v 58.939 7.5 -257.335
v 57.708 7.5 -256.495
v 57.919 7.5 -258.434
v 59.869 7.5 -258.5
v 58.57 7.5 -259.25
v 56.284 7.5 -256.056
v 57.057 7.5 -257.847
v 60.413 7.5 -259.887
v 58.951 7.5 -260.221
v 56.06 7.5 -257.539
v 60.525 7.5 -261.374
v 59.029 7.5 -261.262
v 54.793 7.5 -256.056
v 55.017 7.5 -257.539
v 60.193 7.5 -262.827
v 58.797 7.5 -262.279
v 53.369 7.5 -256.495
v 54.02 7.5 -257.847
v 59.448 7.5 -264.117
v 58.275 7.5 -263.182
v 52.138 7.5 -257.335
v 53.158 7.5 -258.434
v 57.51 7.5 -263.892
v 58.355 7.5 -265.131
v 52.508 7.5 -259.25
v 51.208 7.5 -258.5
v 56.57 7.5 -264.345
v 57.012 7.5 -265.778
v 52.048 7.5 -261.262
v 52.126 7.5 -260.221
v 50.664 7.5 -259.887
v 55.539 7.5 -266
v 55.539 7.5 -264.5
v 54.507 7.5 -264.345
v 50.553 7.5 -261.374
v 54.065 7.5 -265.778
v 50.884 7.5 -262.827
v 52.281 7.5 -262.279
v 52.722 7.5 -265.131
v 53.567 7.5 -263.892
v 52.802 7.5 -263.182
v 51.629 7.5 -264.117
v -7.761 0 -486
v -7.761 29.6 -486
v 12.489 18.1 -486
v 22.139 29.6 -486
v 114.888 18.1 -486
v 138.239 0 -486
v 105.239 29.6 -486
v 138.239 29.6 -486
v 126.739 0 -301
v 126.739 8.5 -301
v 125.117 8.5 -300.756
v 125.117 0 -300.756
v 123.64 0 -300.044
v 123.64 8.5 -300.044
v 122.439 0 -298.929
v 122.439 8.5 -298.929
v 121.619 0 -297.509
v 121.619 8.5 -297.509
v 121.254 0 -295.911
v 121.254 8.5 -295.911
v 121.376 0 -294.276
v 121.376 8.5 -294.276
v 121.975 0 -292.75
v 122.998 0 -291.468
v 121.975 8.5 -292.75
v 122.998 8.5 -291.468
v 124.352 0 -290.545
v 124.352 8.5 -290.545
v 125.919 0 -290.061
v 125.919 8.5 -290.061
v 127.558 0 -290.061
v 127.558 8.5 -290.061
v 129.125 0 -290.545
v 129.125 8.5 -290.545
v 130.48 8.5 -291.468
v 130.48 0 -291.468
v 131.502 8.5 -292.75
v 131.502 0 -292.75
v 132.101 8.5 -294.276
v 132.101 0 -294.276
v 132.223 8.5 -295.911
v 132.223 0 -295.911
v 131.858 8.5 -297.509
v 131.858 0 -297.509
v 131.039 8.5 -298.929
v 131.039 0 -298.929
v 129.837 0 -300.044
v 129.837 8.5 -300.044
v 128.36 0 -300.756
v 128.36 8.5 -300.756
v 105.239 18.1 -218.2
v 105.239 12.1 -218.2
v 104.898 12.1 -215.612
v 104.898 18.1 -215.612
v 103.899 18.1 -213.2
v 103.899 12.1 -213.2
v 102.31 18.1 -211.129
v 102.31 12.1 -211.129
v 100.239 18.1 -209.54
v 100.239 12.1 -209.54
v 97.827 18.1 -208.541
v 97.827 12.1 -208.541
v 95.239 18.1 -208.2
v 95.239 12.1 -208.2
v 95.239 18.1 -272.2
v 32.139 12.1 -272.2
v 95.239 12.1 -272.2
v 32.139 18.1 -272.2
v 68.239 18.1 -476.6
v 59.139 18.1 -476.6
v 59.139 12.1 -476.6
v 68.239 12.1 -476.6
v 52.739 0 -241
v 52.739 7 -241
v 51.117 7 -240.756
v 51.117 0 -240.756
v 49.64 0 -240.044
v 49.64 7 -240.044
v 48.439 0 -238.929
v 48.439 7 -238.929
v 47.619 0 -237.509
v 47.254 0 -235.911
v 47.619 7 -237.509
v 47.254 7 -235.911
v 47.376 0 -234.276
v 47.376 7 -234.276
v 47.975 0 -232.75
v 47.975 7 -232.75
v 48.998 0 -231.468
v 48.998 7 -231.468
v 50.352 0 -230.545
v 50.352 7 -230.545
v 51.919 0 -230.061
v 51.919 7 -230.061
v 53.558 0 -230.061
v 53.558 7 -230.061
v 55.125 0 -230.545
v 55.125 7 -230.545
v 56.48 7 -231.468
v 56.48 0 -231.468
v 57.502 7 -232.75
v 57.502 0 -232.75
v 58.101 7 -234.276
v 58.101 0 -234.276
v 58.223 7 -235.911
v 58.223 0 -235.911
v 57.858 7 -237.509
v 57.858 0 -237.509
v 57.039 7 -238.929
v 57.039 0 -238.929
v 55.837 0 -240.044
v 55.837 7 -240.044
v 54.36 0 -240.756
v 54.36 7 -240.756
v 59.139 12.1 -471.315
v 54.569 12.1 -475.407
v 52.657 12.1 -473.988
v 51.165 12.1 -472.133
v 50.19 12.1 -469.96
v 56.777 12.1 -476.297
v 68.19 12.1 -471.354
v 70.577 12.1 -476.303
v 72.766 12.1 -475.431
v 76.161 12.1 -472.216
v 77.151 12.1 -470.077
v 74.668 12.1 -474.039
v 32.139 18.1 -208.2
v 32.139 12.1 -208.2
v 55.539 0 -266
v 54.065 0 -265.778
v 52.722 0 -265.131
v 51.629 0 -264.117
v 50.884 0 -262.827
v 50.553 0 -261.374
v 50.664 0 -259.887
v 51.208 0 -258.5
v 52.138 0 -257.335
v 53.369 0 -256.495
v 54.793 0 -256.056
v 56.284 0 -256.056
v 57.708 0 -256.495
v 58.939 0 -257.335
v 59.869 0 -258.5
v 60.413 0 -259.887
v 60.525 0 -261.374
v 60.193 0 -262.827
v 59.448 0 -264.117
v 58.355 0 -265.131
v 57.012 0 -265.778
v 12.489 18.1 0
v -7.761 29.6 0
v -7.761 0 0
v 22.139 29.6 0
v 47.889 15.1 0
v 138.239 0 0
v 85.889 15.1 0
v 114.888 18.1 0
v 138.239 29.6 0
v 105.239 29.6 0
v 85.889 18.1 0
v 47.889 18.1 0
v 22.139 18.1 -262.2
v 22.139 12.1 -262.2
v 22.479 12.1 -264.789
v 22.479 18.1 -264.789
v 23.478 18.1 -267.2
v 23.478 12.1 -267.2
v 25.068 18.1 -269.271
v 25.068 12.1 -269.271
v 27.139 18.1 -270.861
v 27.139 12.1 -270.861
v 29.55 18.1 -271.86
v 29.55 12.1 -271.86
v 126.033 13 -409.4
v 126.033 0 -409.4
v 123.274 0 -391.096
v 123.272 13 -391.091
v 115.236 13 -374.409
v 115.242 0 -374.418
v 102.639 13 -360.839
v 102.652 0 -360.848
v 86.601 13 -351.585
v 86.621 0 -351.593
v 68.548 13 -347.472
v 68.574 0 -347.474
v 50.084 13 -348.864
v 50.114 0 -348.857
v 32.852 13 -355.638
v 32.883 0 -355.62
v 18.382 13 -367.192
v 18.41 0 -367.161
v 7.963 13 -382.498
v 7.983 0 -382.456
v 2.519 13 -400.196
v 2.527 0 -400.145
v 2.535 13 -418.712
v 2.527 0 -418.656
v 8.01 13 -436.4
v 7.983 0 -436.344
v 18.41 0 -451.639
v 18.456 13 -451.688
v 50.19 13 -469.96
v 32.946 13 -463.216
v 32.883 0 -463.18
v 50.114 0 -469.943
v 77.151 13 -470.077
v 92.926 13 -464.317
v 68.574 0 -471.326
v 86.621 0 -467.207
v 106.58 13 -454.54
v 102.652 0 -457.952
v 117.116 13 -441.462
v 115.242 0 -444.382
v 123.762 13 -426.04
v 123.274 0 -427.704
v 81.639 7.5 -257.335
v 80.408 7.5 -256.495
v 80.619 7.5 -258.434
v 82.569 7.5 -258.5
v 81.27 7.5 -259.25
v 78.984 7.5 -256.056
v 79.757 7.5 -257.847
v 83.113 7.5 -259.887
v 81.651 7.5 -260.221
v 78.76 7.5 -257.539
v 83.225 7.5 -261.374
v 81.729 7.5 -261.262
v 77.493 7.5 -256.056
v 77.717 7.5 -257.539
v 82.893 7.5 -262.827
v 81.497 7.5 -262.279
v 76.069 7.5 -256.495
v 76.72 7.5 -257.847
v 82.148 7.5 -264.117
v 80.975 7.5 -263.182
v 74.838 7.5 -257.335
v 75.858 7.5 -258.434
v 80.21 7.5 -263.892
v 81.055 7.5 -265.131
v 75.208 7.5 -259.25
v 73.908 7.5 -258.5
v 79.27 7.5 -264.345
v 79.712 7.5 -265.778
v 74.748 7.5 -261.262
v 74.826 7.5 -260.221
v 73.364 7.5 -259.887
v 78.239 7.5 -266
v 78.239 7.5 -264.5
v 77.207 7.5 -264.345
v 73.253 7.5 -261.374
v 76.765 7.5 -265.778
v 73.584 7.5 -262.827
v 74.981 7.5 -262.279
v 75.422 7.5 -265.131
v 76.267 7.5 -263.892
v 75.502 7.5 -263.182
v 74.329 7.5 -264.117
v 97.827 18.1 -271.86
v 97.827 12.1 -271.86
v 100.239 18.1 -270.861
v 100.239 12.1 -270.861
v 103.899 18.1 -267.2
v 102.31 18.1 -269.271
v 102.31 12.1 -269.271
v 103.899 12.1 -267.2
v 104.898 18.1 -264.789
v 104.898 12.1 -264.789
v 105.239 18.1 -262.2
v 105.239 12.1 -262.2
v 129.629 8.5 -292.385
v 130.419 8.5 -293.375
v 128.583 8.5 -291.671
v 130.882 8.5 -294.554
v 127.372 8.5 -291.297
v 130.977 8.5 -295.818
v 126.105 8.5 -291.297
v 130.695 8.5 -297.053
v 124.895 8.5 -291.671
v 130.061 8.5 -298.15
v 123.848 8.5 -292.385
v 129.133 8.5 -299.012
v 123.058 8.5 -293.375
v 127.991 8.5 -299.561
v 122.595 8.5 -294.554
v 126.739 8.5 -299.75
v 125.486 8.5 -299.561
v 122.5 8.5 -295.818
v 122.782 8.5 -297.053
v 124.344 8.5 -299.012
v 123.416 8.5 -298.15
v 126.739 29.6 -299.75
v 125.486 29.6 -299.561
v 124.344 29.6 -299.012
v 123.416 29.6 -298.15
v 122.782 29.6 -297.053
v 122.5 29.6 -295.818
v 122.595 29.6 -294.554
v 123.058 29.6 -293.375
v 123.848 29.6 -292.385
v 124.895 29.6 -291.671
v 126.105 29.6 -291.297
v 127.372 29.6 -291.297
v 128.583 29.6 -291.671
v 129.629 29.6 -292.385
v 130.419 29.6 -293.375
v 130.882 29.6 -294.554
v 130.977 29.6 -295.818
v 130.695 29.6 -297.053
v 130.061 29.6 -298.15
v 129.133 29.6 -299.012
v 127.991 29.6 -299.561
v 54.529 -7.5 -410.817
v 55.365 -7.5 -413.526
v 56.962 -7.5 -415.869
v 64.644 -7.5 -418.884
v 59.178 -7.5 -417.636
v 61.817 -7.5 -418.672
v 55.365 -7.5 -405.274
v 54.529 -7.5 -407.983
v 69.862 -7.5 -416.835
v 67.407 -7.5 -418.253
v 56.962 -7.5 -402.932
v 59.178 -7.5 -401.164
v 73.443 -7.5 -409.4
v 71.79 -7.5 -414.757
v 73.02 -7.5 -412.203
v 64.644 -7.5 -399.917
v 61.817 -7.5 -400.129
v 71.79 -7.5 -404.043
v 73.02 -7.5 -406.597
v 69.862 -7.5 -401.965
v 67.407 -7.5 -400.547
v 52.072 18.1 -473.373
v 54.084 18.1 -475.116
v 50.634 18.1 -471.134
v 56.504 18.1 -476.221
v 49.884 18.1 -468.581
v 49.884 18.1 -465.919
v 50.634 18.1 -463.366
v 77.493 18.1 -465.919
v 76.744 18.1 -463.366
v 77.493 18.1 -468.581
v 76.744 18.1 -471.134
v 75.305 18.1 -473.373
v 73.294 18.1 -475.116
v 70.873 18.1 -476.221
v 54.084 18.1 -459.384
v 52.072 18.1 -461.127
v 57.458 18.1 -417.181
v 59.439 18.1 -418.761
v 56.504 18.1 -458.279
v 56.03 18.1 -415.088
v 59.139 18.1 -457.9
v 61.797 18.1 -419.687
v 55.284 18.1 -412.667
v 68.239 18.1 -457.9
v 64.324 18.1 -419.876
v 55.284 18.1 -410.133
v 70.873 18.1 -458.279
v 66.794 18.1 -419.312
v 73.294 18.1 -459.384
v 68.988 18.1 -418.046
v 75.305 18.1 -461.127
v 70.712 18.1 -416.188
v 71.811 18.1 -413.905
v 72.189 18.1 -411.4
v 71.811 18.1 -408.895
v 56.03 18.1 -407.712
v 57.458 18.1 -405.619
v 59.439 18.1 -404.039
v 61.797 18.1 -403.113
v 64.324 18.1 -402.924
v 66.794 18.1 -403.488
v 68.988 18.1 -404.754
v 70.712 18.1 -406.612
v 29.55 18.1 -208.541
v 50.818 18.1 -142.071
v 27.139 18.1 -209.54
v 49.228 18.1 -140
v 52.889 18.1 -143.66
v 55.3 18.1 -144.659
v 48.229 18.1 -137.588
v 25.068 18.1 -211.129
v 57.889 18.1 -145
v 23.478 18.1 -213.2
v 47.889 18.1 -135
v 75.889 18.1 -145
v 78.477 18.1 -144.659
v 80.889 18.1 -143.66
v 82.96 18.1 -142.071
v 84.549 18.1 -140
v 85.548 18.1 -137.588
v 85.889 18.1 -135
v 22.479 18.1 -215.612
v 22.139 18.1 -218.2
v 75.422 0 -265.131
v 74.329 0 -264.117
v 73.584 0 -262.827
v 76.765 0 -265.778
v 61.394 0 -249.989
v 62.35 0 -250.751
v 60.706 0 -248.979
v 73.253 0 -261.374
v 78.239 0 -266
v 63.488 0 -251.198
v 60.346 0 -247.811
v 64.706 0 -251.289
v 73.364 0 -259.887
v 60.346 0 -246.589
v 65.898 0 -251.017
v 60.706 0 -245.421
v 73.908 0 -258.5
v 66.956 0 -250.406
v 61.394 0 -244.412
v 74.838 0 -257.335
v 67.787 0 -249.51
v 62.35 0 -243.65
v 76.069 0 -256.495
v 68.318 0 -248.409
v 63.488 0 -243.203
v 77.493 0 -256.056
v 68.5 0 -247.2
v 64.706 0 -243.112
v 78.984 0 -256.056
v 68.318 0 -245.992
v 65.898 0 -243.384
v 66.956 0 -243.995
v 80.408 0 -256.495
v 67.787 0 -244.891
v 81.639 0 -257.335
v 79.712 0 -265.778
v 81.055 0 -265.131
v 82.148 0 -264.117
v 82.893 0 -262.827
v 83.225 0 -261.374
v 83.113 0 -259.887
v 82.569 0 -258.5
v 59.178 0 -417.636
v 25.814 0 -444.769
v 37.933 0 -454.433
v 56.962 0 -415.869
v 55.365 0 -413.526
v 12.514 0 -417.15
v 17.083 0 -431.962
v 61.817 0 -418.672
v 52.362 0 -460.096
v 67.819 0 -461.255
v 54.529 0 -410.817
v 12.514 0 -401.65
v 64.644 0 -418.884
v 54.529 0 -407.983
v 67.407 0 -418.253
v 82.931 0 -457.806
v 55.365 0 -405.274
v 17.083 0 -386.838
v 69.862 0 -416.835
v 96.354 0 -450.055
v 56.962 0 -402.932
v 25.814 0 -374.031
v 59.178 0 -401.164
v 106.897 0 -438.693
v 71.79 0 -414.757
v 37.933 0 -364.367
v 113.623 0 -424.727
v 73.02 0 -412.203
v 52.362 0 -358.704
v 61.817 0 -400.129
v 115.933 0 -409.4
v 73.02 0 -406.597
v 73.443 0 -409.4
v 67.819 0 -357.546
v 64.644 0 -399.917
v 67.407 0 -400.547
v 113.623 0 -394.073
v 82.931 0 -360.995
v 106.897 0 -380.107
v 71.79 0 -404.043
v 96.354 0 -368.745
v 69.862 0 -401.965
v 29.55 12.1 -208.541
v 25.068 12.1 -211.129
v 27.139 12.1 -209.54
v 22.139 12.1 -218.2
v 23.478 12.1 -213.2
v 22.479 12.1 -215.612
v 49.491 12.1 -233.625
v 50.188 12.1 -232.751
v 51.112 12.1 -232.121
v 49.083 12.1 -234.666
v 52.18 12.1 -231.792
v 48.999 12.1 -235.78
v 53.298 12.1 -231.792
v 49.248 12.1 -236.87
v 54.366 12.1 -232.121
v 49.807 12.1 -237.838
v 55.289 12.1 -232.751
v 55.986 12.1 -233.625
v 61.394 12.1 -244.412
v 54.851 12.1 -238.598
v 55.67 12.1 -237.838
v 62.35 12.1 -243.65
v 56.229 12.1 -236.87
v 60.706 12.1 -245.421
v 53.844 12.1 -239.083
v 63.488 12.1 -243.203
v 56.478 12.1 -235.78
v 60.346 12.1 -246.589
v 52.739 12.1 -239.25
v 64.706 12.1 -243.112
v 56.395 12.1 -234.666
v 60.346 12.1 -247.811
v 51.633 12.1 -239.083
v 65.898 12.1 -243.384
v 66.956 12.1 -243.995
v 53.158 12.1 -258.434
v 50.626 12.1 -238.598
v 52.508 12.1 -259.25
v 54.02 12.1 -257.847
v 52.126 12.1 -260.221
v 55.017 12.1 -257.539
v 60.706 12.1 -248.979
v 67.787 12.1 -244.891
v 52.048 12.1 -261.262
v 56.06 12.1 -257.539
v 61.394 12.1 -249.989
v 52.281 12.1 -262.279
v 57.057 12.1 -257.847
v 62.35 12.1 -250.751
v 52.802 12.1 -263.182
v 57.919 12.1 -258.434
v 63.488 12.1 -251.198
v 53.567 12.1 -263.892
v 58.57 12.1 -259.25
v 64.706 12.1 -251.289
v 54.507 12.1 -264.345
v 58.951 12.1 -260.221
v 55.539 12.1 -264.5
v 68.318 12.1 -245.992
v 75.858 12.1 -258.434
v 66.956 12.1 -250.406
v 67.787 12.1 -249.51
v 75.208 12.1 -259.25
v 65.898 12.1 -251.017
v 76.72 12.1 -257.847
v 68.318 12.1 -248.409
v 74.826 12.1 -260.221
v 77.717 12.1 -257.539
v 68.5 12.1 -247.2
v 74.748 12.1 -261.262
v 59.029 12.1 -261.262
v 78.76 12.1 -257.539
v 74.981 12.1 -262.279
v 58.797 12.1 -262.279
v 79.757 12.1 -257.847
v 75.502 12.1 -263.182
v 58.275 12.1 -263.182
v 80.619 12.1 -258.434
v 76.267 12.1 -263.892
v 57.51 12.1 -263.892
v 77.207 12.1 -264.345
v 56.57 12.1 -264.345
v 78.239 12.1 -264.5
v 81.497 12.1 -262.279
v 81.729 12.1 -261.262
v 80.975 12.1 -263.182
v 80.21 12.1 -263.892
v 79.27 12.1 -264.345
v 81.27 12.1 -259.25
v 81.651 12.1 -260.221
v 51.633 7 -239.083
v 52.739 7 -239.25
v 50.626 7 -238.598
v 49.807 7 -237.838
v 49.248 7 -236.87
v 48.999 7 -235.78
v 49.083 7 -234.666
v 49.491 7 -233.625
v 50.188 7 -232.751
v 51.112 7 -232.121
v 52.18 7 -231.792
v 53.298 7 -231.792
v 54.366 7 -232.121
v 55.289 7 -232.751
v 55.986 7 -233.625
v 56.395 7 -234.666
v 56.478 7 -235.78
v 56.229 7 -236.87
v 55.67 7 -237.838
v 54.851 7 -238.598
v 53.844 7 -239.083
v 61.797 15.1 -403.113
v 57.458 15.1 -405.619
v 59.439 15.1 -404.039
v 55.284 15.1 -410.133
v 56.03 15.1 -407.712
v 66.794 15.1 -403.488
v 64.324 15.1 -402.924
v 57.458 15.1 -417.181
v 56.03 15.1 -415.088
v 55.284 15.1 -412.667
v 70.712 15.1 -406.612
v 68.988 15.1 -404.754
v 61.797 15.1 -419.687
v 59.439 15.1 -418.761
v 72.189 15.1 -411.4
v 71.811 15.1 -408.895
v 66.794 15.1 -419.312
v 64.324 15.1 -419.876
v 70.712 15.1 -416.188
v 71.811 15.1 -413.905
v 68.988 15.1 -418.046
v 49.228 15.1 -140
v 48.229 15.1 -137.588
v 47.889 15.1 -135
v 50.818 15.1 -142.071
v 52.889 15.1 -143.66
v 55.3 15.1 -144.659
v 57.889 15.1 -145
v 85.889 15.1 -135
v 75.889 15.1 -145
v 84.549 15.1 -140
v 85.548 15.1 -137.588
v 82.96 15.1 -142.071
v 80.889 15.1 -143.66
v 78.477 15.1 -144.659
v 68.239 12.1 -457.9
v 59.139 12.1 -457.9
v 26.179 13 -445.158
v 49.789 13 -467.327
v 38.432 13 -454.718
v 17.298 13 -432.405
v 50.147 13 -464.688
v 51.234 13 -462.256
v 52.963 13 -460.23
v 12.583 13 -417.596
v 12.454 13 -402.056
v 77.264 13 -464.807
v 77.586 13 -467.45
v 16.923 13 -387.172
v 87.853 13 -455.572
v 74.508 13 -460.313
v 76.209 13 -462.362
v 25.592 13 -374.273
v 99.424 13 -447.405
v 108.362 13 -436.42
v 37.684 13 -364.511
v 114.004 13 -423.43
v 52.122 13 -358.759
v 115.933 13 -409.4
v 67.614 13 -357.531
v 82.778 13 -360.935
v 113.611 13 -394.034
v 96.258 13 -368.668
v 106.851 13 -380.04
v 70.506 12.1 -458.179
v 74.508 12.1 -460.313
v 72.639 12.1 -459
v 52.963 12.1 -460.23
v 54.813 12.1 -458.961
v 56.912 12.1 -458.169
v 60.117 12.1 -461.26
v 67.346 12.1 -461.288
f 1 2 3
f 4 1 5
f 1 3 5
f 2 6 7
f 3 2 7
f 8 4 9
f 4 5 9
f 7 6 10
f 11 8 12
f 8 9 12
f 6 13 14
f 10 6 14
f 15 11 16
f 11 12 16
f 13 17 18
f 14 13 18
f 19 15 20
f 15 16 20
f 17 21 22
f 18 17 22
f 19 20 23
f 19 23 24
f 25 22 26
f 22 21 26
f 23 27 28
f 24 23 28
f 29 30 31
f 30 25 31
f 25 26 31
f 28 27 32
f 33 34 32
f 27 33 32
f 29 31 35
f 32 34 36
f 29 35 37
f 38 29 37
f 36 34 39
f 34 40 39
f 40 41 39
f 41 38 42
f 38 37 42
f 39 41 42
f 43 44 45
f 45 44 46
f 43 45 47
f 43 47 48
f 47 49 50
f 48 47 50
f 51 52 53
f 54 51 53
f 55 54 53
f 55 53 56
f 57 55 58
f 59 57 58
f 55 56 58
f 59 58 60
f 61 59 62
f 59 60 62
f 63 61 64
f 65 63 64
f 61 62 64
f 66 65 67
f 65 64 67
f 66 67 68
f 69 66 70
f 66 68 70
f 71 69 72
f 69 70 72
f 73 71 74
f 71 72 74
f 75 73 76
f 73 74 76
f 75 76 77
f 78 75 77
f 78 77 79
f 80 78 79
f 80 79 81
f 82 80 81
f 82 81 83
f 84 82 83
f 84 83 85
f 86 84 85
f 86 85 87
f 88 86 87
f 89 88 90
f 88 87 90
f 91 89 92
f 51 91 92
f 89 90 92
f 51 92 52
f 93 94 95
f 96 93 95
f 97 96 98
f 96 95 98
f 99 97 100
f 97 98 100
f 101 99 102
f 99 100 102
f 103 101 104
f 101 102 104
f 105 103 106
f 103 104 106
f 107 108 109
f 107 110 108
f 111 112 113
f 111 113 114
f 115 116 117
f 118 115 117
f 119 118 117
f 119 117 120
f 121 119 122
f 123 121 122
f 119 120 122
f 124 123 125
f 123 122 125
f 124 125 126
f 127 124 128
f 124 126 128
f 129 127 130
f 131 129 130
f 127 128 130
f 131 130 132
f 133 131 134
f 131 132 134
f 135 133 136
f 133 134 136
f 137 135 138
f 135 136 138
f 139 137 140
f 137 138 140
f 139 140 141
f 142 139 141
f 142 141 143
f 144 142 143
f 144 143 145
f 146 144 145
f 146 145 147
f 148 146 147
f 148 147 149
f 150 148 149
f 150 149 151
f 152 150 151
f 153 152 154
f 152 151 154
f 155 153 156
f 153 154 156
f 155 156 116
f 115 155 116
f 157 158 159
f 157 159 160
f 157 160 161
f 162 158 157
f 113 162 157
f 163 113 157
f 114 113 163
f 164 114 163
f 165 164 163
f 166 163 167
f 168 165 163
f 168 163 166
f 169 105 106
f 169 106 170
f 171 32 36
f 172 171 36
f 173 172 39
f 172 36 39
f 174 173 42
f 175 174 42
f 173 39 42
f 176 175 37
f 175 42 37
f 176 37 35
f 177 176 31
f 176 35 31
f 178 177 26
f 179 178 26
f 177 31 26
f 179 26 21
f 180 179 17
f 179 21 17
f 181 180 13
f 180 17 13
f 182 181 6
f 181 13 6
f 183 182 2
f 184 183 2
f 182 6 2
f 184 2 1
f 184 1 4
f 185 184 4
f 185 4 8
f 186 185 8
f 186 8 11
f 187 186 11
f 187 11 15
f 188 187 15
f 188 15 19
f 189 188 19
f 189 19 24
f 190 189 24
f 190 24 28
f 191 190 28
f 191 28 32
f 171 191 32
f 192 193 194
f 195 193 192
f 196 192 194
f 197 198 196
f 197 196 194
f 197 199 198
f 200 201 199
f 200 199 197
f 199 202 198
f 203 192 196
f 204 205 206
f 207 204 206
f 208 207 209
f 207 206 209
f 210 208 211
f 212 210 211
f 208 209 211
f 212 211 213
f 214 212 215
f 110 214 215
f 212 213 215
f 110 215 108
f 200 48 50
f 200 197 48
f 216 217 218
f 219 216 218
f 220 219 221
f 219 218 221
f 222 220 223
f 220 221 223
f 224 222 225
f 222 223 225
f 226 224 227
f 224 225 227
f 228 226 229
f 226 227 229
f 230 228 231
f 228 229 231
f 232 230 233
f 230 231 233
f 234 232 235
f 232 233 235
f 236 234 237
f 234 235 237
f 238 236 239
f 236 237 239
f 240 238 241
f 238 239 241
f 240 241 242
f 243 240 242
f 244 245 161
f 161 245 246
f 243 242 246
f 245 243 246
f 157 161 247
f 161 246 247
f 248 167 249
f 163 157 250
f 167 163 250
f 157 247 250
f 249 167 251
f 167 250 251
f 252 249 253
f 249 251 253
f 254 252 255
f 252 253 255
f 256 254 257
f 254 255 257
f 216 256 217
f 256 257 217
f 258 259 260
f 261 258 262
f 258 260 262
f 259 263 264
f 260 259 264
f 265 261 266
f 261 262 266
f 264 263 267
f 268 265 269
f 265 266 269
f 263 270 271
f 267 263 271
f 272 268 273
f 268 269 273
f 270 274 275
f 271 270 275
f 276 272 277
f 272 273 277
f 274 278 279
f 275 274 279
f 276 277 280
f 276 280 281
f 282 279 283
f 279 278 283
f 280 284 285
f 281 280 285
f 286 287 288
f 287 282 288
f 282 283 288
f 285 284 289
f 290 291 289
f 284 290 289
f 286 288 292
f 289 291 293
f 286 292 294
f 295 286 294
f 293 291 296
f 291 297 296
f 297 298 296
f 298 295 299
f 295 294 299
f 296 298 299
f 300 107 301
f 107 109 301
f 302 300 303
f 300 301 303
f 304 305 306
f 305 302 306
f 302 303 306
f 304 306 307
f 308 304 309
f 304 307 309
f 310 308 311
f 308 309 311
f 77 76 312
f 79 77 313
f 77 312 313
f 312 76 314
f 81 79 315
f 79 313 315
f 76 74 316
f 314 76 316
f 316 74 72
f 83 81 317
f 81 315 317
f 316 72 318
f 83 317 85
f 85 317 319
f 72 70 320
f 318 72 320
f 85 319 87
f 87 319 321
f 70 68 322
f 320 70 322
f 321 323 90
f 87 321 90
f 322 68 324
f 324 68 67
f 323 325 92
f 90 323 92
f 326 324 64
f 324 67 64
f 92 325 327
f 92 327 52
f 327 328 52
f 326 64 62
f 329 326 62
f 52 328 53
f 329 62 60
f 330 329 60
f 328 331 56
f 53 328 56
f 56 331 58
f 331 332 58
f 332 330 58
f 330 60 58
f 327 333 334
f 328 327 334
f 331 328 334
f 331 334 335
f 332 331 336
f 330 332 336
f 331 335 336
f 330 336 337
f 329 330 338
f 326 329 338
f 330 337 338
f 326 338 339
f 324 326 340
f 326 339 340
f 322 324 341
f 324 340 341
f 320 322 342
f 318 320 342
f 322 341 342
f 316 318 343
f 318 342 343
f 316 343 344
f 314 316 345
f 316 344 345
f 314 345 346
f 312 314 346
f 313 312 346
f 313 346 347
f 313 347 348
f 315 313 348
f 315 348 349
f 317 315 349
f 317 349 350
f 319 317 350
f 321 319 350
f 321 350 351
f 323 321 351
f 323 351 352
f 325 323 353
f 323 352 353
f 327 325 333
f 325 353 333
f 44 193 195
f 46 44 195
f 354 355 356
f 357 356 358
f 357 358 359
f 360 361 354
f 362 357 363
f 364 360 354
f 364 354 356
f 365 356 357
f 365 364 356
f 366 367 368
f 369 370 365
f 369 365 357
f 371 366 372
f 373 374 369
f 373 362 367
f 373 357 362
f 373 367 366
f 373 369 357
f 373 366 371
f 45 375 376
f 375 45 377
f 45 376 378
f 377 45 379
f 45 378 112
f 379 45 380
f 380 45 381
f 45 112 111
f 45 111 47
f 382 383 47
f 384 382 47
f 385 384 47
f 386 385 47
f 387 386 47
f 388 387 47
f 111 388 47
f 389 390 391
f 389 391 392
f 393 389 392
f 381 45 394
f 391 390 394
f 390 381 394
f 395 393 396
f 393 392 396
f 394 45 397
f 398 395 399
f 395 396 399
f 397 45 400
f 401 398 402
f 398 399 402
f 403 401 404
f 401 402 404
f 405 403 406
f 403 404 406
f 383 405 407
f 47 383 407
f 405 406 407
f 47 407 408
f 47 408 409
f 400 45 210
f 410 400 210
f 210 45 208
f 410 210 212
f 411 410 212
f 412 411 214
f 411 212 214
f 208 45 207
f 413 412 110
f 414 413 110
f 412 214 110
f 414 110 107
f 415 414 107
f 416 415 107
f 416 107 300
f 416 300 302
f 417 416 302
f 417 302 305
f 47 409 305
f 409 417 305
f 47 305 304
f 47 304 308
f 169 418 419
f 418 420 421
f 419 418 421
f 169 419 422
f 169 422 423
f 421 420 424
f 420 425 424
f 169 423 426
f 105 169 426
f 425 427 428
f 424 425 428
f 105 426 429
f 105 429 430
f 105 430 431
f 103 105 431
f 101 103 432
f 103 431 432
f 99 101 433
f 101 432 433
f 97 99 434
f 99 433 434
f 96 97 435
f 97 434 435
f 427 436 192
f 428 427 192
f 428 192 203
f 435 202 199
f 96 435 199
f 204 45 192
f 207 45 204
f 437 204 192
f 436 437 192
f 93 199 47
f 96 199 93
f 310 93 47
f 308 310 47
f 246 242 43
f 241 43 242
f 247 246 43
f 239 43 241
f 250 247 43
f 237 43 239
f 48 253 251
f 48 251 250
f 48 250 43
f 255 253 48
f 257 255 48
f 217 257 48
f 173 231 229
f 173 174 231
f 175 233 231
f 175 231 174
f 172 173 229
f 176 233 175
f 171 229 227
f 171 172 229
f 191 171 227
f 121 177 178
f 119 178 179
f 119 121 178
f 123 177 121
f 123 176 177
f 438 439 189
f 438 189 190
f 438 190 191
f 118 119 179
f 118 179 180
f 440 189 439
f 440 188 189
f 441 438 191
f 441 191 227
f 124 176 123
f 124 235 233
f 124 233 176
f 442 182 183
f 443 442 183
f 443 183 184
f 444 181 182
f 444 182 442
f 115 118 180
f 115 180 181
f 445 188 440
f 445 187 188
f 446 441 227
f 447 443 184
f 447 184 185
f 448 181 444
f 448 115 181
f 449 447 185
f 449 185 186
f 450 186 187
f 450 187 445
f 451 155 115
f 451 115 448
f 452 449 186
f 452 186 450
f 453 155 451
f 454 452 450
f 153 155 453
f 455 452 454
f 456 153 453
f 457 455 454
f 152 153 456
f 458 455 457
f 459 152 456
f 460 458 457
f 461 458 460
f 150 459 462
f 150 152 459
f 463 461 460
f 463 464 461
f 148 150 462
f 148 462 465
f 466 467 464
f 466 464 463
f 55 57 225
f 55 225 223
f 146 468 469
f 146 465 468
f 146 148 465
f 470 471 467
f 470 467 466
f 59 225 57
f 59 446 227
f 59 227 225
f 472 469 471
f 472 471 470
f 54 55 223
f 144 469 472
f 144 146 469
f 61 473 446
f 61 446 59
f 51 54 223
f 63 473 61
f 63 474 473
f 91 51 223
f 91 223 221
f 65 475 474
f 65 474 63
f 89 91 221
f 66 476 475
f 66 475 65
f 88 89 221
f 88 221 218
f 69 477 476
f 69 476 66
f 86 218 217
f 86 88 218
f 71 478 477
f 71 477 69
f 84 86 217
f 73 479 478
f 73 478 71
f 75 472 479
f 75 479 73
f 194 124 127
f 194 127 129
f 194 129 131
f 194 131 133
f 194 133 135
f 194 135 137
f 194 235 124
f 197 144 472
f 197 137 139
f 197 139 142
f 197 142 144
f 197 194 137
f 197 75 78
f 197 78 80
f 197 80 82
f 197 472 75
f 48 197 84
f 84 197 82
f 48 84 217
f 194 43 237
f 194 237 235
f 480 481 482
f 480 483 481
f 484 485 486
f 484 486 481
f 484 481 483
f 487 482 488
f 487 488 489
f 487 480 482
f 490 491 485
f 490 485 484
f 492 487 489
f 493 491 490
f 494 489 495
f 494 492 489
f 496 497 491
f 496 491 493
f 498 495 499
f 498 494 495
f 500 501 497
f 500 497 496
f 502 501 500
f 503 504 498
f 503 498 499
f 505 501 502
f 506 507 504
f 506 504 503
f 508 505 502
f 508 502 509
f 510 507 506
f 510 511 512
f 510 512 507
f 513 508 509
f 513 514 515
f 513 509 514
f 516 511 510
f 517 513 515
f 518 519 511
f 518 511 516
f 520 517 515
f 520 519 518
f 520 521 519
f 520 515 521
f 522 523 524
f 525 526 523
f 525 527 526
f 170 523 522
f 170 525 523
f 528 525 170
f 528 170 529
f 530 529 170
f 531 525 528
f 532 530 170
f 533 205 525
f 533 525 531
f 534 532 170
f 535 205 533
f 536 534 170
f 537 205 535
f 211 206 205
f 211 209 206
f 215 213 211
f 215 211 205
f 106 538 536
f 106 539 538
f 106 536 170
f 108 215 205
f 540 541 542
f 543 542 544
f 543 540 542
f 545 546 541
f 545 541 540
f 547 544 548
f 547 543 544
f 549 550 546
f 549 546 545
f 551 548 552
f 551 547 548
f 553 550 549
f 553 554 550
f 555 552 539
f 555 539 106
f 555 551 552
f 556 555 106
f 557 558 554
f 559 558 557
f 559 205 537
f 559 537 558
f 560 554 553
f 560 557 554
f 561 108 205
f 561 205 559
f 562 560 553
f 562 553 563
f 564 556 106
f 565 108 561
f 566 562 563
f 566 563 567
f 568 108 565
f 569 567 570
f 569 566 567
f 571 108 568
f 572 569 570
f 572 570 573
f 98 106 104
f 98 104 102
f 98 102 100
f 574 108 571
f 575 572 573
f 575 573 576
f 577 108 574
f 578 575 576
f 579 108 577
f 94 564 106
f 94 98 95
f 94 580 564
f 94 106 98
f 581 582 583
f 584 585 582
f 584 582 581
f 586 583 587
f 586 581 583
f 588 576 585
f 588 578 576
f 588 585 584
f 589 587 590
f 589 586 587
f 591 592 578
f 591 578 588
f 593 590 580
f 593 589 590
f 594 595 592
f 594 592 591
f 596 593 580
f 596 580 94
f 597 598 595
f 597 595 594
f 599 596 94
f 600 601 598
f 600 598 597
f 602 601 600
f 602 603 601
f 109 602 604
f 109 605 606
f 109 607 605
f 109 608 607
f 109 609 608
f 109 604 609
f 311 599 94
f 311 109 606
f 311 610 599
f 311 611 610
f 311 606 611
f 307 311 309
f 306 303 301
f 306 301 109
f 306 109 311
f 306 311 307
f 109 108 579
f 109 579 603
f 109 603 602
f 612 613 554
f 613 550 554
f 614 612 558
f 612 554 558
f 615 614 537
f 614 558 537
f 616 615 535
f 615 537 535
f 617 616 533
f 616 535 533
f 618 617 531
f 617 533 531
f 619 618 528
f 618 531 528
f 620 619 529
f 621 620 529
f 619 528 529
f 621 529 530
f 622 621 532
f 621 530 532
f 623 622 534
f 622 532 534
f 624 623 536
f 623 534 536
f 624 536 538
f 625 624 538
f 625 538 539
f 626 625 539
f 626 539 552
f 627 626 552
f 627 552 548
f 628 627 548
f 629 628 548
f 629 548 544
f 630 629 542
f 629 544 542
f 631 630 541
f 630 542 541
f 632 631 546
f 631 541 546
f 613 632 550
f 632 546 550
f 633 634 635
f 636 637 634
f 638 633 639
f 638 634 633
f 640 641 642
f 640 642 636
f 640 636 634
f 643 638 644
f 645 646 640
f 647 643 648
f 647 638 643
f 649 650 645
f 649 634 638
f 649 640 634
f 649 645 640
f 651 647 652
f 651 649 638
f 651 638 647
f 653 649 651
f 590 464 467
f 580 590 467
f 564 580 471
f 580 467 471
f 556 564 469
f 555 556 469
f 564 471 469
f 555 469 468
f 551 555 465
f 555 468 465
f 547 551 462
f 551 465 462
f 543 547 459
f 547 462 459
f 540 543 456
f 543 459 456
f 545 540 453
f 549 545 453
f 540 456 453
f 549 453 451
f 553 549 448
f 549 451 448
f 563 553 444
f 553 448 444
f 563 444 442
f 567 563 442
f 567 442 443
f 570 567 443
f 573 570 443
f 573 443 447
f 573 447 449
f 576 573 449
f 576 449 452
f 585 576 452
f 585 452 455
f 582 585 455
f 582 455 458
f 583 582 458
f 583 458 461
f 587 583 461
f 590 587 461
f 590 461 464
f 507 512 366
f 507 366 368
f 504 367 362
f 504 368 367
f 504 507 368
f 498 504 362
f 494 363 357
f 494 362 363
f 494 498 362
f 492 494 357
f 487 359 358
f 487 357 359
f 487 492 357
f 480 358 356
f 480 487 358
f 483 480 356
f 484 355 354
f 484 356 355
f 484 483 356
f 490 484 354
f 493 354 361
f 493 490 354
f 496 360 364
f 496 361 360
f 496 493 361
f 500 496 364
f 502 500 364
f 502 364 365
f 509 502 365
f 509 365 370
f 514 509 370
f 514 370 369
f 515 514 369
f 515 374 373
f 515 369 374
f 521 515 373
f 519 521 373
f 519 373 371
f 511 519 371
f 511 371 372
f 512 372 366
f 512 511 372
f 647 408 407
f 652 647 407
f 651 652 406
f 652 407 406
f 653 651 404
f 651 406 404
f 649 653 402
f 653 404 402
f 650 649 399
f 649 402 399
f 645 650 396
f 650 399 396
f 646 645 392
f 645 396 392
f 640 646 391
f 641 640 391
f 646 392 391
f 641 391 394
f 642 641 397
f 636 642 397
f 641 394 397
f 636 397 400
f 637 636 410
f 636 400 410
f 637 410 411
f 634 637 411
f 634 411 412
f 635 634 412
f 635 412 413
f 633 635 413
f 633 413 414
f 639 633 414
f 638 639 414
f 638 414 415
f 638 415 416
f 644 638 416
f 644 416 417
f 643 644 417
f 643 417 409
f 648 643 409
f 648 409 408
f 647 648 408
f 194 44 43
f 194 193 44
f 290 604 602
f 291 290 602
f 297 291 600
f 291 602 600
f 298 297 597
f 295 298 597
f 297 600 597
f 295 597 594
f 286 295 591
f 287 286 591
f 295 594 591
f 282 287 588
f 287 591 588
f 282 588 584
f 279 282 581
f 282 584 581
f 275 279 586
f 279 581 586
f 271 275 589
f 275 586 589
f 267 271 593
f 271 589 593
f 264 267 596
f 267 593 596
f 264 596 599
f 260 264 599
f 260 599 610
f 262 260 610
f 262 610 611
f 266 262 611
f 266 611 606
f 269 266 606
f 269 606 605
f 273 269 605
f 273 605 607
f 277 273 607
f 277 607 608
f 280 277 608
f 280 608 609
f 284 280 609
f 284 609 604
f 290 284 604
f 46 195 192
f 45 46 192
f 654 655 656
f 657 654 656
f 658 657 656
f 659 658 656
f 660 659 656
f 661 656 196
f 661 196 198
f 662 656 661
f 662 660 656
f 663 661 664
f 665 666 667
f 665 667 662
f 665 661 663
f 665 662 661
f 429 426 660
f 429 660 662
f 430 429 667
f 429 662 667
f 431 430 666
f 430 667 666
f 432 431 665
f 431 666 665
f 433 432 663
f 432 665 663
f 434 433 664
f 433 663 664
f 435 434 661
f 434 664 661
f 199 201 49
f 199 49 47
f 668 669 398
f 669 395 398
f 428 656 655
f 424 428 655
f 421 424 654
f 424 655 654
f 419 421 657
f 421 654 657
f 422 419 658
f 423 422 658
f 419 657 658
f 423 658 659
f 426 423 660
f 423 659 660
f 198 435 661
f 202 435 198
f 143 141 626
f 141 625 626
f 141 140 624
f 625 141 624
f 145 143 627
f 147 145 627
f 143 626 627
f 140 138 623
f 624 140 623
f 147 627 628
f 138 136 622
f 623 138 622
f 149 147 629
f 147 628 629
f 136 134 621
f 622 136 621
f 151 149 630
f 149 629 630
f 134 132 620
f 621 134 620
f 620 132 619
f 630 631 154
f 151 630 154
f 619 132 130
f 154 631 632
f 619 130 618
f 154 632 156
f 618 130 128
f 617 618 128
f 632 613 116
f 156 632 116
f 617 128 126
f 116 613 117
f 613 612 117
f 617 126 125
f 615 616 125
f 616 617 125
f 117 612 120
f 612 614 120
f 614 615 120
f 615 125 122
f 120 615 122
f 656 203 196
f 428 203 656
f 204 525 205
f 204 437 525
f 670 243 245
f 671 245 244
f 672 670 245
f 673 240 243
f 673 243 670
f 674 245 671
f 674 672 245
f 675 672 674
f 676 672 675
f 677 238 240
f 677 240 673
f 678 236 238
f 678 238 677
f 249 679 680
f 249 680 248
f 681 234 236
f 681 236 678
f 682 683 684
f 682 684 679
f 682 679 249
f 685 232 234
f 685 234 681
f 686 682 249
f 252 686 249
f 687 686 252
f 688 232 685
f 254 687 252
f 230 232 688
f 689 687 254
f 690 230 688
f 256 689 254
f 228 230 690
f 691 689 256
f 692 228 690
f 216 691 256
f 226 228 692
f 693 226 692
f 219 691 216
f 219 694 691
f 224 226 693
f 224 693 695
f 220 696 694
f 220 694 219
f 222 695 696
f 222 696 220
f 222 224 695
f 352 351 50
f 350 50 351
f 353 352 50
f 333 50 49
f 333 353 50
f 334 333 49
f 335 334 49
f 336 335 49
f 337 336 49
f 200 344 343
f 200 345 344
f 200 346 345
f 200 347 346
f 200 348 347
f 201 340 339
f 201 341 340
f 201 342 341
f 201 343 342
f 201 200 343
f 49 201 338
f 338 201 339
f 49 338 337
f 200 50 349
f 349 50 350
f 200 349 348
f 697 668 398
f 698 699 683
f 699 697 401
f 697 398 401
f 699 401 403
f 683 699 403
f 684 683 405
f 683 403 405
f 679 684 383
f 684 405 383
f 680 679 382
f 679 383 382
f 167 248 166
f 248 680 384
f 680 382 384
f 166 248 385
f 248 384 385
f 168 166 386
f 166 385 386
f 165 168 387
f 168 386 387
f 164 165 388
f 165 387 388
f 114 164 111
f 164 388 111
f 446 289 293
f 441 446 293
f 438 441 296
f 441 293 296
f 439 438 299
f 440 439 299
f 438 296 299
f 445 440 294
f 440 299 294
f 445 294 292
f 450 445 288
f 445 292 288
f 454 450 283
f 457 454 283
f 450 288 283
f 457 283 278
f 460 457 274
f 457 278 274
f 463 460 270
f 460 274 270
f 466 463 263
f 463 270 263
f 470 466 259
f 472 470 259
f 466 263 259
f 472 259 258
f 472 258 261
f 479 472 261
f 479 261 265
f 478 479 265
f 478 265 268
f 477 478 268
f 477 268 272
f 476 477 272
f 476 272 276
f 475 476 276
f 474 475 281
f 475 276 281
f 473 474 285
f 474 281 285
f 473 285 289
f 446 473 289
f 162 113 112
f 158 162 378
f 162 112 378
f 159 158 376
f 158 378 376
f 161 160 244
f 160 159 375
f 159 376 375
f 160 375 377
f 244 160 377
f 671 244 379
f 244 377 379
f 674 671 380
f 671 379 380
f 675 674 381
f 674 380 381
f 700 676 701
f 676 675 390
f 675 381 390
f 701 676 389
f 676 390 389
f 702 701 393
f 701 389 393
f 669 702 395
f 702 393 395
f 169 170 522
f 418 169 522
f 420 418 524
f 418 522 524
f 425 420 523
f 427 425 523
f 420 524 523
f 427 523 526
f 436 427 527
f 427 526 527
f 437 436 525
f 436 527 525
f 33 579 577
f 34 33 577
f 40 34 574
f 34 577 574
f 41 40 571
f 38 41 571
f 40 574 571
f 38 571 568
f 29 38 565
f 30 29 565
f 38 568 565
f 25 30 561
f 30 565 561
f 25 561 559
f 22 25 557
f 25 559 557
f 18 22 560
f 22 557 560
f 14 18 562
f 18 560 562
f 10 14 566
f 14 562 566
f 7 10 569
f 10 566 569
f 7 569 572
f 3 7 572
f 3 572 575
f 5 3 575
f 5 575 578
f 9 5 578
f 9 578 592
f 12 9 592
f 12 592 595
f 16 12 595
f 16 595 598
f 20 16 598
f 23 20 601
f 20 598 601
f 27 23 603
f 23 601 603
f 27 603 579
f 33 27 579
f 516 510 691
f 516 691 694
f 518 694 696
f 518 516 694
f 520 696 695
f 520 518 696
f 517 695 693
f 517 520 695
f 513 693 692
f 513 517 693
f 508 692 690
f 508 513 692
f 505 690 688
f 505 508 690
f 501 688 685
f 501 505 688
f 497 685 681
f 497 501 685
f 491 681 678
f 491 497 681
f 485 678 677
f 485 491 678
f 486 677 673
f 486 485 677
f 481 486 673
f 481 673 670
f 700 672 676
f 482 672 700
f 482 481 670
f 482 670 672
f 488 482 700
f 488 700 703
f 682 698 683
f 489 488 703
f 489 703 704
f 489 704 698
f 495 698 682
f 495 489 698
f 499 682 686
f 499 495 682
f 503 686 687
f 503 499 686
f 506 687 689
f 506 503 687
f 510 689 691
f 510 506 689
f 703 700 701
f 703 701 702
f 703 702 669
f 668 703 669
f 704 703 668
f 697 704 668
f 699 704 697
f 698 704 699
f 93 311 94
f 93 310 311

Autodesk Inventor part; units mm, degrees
ref_plane "YZ Plane" through (0, 0, 0) normal (1, 0, 0) x (0, 1, 0)
ref_plane "XZ Plane" through (0, 0, 0) normal (0, 1, 0) x (-1, 0, 0)
ref_plane "XY Plane" through (0, 0, 0) normal (0, 0, 1) x (1, 0, 0)
sketch "Sketch1" plane through (0, 0, 0) normal (0, 0, 1) x (1, 0, 0)
  line L0 (-7.7614, 0) -> (138.2386, 0)
  line L1 (138.2386, 0) -> (138.2386, 29.6)
  line L2 (-7.7614, 29.6) -> (-7.7614, 0)
  line L3 (-7.7614, 29.6) -> (22.1386, 29.6)
  line L4 (12.489, 18.1) -> (114.8883, 18.1)
  line L5 (22.1386, 29.6) -> (12.489, 18.1)
  line L6 (22.1386, 29.6) -> (41.4586, 29.6) construction
  line L7 (138.2386, 29.6) -> (105.2386, 29.6)
  line L8 (105.2386, 29.6) -> (114.8883, 18.1)
  point P0 (0, 0)
  dimension "d0" = 146
  dimension "d1" = 29.6
  dimension "d2" = 29.9
  dimension "d4" = 130
  dimension "d5" = 33
  dimension "d6" = 50
extrude "Extrusion1" add sketch "Sketch1" against normal blind 486
sketch "Sketch2" plane through (-7.7614, 29.6, 0) normal (0, 1, 0) x (1, 0, 0)
  line L0 (113, 0) -> (122.6496, 0) projected
  line L1 (124, 486) -> (113, 0)
  line L2 (113, 0) -> (113, 486) projected
  line L3 (113, 486) -> (124, 486)
  line L4 (122.6496, 0) -> (122.6496, 486) projected
  line L5 (113, 486) -> (113, 0)
  line L6 (146, 0) -> (146, 486) projected
  point P0 (7.7614, 0)
  dimension "d9" = 22
sketch "Sketch3" plane through (-7.7614, 0, 0) normal (0, -1, 0) x (1, 0, 0)
  line L0 (20.2504, -486) -> (122.6496, -486) projected
  line L1 (0, 0) -> (146, 0) projected
  circle A0 centre (71.6943, -409.4001) radius 62.1
  line L2 (71.45, -486) -> (71.4962, -471.5001)
  circle A1 centre (71.6943, -409.4001) radius 52
  circle A2 centre (71.6943, -409.4001) radius 9.51
  circle A3 centre (72.1613, -247.2004) radius 4.1
  point P0 (7.7614, 0)
  dimension "d10" = 124.2
  dimension "d11" = 14.5
  dimension "d12" = 62.1
  dimension "d13" = 104
  dimension "d14" = 19.02
  dimension "d15" = 8.2
extrude "Extrusion2" cut sketch "Sketch3" against normal blind 13 contours A0
extrude "Extrusion3" add sketch "Sketch3" along normal blind 7.5 contours A2
extrude "Extrusion4" cut sketch "Sketch3" against normal through all contours A3
sketch "Sketch4" plane through (12.489, 18.1, 0) normal (0, 1, 0) x (1, 0, 0)
  circle A0 centre (51.911, 247.2004) radius 4.1 projected
  circle A1 centre (51.911, 247.2004) radius 9.5
  line L0 (0, 486) -> (102.3993, 486) projected
  line L1 (51.1996, 486) -> (51.1996, 476.6)
  arc A2 (46.6496, 476.6) -> (46.6496, 457.9) centre (46.6496, 467.25) ccw
  arc A3 (55.7496, 457.9) -> (55.7496, 476.6) centre (55.7496, 467.25) ccw
  line L2 (46.6496, 476.6) -> (55.7496, 476.6)
  line L3 (46.6496, 457.9) -> (55.7496, 457.9)
  circle A4 centre (51.1996, 411.4) radius 8.5
  point P0 (-12.489, 0)
  point P1 (51.1996, 476.6)
  dimension "d23" = 19
  dimension "d26" = 9.4
  dimension "d29" = 0
  dimension "d30" = 18.7
  dimension "d31" = 18.7
  dimension "d38" = 17
  dimension "d39" = 46.5
extrude "Extrusion5" cut sketch "Sketch4" against normal blind 3.7 contours A1
extrude "Extrusion7" cut sketch "Sketch4" against normal blind 6 contours L2 A3 L3 A2
extrude "Extrusion8" cut sketch "Sketch4" against normal blind 3 contours A4
sketch "Sketch5" plane through (-7.7614, 0, 0) normal (0, -1, 0) x (1, 0, 0)
  point P0 (7.7614, 0)
sketch "Sketch6" plane through (-7.7614, 0, 0) normal (0, -1, 0) x (1, 0, 0)
  line L0 (146, -486) -> (0, -486) projected
  line L1 (146, 0) -> (146, -486) projected
  circle A0 centre (60.5, -235.5) radius 5.5
  line L2 (0, 0) -> (0, -486) projected
  circle A1 centre (134.5, -295.5) radius 5.5
  point P0 (7.7614, 0)
  point P1 (86, -261)
  dimension "d45" = 11
  dimension "d46" = 60.5
  dimension "d47" = 250.5
  dimension "d48" = 11
  dimension "d49" = 190.5
  dimension "d50" = 11.5
hole "Hole1" at (126.7386, 0, -295.5) direction (0, 1, 0) diameter 8.5 end through all counterbore diameter 11 counterbore depth 8.5
hole "Hole2" at (78.2386, 0, -261) direction (0, 1, 0) diameter 7 end through all counterbore diameter 10 counterbore depth 7.5
hole "Hole3" at (52.7386, 0, -235.5) direction (0, 1, 0) diameter 7.5 end through all counterbore diameter 11 counterbore depth 7
thread "Thread1" size "M9x1.25" class "6H" standard "ANSI Metric M Profile" full length
sketch "Sketch14" plane through (12.489, 18.1, 0) normal (0, 1, 0) x (1, 0, 0)
  circle A0 centre (51.911, 247.2004) radius 4.1 construction
  line L0 (51.911, 247.2004) -> (92.7496, 247.2004) construction
  line L1 (92.7496, 0) -> (92.7496, 486) construction
  line L2 (92.7496, 247.2004) -> (92.7496, 208.2004) construction
  line L3 (92.7496, 208.2004) -> (9.6496, 208.2004)
  line L4 (9.6496, 208.2004) -> (9.6496, 272.2004)
  line L5 (9.6496, 272.2004) -> (92.7496, 272.2004)
  line L6 (92.7496, 272.2004) -> (92.7496, 208.2004)
  point P0 (-12.489, 0)
  dimension "d82" = 39
  dimension "d83" = 83.1
  dimension "d84" = 64
extrude "Extrusion11" cut sketch "Sketch14" against normal blind 6
sketch "Sketch17" plane through (12.489, 18.1, 0) normal (0, 1, 0) x (1, 0, 0)
  line L0 (92.7496, 0) -> (92.7496, 486) construction
  line L1 (92.7496, 0) -> (73.3996, 0) construction
  line L2 (-20.2504, 0) -> (125.7496, 0) construction
  line L3 (73.3996, 0) -> (35.3996, 0)
  line L4 (35.3996, 0) -> (35.3996, 145)
  line L5 (35.3996, 145) -> (73.3996, 145)
  line L6 (73.3996, 145) -> (73.3996, 0)
  point P0 (-12.489, 0)
  dimension "d99" = 19.35
  dimension "d100" = 38
  dimension "d101" = 145
extrude "Extrusion13" cut sketch "Sketch17" against normal blind 3
sketch "Sketch18" plane through (-7.7614, 0, 0) normal (0, -1, 0) x (1, 0, 0)
  circle A0 centre (86, -261) radius 5 projected
  point P0 (7.7614, 0)
  point P1 (63.3, -261)
  dimension "d112" = 22.7
hole "Hole5" at (55.5386, 0, -261) direction (0, 1, 0) diameter 7 end through all counterbore diameter 10 counterbore depth 7.5
fillet "Fillet1" radius 10 6 edges at (22.1386, 15.1, -208.2004) (22.1386, 15.1, -272.2004) (105.2386, 15.1, -208.2004) (105.2386, 15.1, -272.2004) (47.8886, 16.6, -145) (85.8886, 16.6, -145)
properties part number "slide ontop of saddle" material "Steel, Cast"
